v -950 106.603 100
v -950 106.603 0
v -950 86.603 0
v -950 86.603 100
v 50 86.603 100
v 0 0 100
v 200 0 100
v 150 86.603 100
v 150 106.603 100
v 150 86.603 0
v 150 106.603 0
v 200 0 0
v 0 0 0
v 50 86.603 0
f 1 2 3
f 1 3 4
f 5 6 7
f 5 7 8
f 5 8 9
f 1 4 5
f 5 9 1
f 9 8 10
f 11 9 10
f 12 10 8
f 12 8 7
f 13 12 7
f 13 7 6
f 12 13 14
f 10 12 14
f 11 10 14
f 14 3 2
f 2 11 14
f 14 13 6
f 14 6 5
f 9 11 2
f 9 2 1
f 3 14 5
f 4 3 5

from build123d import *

# Parameters (mm, degrees)
SALIENTE_EXTRUIR1_DEPTH = 100
CROQUIS2_W              = 100
CROQUIS2_H              = 100
SALIENTE_EXTRUIR2_DEPTH = 20
CROQUIS3_W              = 100
CROQUIS3_H              = 20
SALIENTE_EXTRUIR3_DEPTH = 1000


with BuildPart() as part:
    # Croquis1 → Saliente-Extruir1 (new body)
    with BuildSketch(Plane.XY):
        Polygon((0, 0), (50, 86.602540378), (150, 86.602540378), (200, 0), align=None)
    extrude(amount=SALIENTE_EXTRUIR1_DEPTH)

    # Croquis2 → Saliente-Extruir2 (add)
    with BuildSketch(Plane(origin=(0, 86.602540378, 0), x_dir=(1, 0, 0), z_dir=(0, 1, 0))):
        with Locations((100, -50)):
            Rectangle(CROQUIS2_W, CROQUIS2_H)
    extrude(amount=SALIENTE_EXTRUIR2_DEPTH)

    # Croquis3 → Saliente-Extruir3 (add)
    with BuildSketch(Plane.ZY.offset(-50)):
        with Locations((50, 96.602540378)):
            Rectangle(CROQUIS3_W, CROQUIS3_H)
    extrude(amount=SALIENTE_EXTRUIR3_DEPTH)


solid = part.part
